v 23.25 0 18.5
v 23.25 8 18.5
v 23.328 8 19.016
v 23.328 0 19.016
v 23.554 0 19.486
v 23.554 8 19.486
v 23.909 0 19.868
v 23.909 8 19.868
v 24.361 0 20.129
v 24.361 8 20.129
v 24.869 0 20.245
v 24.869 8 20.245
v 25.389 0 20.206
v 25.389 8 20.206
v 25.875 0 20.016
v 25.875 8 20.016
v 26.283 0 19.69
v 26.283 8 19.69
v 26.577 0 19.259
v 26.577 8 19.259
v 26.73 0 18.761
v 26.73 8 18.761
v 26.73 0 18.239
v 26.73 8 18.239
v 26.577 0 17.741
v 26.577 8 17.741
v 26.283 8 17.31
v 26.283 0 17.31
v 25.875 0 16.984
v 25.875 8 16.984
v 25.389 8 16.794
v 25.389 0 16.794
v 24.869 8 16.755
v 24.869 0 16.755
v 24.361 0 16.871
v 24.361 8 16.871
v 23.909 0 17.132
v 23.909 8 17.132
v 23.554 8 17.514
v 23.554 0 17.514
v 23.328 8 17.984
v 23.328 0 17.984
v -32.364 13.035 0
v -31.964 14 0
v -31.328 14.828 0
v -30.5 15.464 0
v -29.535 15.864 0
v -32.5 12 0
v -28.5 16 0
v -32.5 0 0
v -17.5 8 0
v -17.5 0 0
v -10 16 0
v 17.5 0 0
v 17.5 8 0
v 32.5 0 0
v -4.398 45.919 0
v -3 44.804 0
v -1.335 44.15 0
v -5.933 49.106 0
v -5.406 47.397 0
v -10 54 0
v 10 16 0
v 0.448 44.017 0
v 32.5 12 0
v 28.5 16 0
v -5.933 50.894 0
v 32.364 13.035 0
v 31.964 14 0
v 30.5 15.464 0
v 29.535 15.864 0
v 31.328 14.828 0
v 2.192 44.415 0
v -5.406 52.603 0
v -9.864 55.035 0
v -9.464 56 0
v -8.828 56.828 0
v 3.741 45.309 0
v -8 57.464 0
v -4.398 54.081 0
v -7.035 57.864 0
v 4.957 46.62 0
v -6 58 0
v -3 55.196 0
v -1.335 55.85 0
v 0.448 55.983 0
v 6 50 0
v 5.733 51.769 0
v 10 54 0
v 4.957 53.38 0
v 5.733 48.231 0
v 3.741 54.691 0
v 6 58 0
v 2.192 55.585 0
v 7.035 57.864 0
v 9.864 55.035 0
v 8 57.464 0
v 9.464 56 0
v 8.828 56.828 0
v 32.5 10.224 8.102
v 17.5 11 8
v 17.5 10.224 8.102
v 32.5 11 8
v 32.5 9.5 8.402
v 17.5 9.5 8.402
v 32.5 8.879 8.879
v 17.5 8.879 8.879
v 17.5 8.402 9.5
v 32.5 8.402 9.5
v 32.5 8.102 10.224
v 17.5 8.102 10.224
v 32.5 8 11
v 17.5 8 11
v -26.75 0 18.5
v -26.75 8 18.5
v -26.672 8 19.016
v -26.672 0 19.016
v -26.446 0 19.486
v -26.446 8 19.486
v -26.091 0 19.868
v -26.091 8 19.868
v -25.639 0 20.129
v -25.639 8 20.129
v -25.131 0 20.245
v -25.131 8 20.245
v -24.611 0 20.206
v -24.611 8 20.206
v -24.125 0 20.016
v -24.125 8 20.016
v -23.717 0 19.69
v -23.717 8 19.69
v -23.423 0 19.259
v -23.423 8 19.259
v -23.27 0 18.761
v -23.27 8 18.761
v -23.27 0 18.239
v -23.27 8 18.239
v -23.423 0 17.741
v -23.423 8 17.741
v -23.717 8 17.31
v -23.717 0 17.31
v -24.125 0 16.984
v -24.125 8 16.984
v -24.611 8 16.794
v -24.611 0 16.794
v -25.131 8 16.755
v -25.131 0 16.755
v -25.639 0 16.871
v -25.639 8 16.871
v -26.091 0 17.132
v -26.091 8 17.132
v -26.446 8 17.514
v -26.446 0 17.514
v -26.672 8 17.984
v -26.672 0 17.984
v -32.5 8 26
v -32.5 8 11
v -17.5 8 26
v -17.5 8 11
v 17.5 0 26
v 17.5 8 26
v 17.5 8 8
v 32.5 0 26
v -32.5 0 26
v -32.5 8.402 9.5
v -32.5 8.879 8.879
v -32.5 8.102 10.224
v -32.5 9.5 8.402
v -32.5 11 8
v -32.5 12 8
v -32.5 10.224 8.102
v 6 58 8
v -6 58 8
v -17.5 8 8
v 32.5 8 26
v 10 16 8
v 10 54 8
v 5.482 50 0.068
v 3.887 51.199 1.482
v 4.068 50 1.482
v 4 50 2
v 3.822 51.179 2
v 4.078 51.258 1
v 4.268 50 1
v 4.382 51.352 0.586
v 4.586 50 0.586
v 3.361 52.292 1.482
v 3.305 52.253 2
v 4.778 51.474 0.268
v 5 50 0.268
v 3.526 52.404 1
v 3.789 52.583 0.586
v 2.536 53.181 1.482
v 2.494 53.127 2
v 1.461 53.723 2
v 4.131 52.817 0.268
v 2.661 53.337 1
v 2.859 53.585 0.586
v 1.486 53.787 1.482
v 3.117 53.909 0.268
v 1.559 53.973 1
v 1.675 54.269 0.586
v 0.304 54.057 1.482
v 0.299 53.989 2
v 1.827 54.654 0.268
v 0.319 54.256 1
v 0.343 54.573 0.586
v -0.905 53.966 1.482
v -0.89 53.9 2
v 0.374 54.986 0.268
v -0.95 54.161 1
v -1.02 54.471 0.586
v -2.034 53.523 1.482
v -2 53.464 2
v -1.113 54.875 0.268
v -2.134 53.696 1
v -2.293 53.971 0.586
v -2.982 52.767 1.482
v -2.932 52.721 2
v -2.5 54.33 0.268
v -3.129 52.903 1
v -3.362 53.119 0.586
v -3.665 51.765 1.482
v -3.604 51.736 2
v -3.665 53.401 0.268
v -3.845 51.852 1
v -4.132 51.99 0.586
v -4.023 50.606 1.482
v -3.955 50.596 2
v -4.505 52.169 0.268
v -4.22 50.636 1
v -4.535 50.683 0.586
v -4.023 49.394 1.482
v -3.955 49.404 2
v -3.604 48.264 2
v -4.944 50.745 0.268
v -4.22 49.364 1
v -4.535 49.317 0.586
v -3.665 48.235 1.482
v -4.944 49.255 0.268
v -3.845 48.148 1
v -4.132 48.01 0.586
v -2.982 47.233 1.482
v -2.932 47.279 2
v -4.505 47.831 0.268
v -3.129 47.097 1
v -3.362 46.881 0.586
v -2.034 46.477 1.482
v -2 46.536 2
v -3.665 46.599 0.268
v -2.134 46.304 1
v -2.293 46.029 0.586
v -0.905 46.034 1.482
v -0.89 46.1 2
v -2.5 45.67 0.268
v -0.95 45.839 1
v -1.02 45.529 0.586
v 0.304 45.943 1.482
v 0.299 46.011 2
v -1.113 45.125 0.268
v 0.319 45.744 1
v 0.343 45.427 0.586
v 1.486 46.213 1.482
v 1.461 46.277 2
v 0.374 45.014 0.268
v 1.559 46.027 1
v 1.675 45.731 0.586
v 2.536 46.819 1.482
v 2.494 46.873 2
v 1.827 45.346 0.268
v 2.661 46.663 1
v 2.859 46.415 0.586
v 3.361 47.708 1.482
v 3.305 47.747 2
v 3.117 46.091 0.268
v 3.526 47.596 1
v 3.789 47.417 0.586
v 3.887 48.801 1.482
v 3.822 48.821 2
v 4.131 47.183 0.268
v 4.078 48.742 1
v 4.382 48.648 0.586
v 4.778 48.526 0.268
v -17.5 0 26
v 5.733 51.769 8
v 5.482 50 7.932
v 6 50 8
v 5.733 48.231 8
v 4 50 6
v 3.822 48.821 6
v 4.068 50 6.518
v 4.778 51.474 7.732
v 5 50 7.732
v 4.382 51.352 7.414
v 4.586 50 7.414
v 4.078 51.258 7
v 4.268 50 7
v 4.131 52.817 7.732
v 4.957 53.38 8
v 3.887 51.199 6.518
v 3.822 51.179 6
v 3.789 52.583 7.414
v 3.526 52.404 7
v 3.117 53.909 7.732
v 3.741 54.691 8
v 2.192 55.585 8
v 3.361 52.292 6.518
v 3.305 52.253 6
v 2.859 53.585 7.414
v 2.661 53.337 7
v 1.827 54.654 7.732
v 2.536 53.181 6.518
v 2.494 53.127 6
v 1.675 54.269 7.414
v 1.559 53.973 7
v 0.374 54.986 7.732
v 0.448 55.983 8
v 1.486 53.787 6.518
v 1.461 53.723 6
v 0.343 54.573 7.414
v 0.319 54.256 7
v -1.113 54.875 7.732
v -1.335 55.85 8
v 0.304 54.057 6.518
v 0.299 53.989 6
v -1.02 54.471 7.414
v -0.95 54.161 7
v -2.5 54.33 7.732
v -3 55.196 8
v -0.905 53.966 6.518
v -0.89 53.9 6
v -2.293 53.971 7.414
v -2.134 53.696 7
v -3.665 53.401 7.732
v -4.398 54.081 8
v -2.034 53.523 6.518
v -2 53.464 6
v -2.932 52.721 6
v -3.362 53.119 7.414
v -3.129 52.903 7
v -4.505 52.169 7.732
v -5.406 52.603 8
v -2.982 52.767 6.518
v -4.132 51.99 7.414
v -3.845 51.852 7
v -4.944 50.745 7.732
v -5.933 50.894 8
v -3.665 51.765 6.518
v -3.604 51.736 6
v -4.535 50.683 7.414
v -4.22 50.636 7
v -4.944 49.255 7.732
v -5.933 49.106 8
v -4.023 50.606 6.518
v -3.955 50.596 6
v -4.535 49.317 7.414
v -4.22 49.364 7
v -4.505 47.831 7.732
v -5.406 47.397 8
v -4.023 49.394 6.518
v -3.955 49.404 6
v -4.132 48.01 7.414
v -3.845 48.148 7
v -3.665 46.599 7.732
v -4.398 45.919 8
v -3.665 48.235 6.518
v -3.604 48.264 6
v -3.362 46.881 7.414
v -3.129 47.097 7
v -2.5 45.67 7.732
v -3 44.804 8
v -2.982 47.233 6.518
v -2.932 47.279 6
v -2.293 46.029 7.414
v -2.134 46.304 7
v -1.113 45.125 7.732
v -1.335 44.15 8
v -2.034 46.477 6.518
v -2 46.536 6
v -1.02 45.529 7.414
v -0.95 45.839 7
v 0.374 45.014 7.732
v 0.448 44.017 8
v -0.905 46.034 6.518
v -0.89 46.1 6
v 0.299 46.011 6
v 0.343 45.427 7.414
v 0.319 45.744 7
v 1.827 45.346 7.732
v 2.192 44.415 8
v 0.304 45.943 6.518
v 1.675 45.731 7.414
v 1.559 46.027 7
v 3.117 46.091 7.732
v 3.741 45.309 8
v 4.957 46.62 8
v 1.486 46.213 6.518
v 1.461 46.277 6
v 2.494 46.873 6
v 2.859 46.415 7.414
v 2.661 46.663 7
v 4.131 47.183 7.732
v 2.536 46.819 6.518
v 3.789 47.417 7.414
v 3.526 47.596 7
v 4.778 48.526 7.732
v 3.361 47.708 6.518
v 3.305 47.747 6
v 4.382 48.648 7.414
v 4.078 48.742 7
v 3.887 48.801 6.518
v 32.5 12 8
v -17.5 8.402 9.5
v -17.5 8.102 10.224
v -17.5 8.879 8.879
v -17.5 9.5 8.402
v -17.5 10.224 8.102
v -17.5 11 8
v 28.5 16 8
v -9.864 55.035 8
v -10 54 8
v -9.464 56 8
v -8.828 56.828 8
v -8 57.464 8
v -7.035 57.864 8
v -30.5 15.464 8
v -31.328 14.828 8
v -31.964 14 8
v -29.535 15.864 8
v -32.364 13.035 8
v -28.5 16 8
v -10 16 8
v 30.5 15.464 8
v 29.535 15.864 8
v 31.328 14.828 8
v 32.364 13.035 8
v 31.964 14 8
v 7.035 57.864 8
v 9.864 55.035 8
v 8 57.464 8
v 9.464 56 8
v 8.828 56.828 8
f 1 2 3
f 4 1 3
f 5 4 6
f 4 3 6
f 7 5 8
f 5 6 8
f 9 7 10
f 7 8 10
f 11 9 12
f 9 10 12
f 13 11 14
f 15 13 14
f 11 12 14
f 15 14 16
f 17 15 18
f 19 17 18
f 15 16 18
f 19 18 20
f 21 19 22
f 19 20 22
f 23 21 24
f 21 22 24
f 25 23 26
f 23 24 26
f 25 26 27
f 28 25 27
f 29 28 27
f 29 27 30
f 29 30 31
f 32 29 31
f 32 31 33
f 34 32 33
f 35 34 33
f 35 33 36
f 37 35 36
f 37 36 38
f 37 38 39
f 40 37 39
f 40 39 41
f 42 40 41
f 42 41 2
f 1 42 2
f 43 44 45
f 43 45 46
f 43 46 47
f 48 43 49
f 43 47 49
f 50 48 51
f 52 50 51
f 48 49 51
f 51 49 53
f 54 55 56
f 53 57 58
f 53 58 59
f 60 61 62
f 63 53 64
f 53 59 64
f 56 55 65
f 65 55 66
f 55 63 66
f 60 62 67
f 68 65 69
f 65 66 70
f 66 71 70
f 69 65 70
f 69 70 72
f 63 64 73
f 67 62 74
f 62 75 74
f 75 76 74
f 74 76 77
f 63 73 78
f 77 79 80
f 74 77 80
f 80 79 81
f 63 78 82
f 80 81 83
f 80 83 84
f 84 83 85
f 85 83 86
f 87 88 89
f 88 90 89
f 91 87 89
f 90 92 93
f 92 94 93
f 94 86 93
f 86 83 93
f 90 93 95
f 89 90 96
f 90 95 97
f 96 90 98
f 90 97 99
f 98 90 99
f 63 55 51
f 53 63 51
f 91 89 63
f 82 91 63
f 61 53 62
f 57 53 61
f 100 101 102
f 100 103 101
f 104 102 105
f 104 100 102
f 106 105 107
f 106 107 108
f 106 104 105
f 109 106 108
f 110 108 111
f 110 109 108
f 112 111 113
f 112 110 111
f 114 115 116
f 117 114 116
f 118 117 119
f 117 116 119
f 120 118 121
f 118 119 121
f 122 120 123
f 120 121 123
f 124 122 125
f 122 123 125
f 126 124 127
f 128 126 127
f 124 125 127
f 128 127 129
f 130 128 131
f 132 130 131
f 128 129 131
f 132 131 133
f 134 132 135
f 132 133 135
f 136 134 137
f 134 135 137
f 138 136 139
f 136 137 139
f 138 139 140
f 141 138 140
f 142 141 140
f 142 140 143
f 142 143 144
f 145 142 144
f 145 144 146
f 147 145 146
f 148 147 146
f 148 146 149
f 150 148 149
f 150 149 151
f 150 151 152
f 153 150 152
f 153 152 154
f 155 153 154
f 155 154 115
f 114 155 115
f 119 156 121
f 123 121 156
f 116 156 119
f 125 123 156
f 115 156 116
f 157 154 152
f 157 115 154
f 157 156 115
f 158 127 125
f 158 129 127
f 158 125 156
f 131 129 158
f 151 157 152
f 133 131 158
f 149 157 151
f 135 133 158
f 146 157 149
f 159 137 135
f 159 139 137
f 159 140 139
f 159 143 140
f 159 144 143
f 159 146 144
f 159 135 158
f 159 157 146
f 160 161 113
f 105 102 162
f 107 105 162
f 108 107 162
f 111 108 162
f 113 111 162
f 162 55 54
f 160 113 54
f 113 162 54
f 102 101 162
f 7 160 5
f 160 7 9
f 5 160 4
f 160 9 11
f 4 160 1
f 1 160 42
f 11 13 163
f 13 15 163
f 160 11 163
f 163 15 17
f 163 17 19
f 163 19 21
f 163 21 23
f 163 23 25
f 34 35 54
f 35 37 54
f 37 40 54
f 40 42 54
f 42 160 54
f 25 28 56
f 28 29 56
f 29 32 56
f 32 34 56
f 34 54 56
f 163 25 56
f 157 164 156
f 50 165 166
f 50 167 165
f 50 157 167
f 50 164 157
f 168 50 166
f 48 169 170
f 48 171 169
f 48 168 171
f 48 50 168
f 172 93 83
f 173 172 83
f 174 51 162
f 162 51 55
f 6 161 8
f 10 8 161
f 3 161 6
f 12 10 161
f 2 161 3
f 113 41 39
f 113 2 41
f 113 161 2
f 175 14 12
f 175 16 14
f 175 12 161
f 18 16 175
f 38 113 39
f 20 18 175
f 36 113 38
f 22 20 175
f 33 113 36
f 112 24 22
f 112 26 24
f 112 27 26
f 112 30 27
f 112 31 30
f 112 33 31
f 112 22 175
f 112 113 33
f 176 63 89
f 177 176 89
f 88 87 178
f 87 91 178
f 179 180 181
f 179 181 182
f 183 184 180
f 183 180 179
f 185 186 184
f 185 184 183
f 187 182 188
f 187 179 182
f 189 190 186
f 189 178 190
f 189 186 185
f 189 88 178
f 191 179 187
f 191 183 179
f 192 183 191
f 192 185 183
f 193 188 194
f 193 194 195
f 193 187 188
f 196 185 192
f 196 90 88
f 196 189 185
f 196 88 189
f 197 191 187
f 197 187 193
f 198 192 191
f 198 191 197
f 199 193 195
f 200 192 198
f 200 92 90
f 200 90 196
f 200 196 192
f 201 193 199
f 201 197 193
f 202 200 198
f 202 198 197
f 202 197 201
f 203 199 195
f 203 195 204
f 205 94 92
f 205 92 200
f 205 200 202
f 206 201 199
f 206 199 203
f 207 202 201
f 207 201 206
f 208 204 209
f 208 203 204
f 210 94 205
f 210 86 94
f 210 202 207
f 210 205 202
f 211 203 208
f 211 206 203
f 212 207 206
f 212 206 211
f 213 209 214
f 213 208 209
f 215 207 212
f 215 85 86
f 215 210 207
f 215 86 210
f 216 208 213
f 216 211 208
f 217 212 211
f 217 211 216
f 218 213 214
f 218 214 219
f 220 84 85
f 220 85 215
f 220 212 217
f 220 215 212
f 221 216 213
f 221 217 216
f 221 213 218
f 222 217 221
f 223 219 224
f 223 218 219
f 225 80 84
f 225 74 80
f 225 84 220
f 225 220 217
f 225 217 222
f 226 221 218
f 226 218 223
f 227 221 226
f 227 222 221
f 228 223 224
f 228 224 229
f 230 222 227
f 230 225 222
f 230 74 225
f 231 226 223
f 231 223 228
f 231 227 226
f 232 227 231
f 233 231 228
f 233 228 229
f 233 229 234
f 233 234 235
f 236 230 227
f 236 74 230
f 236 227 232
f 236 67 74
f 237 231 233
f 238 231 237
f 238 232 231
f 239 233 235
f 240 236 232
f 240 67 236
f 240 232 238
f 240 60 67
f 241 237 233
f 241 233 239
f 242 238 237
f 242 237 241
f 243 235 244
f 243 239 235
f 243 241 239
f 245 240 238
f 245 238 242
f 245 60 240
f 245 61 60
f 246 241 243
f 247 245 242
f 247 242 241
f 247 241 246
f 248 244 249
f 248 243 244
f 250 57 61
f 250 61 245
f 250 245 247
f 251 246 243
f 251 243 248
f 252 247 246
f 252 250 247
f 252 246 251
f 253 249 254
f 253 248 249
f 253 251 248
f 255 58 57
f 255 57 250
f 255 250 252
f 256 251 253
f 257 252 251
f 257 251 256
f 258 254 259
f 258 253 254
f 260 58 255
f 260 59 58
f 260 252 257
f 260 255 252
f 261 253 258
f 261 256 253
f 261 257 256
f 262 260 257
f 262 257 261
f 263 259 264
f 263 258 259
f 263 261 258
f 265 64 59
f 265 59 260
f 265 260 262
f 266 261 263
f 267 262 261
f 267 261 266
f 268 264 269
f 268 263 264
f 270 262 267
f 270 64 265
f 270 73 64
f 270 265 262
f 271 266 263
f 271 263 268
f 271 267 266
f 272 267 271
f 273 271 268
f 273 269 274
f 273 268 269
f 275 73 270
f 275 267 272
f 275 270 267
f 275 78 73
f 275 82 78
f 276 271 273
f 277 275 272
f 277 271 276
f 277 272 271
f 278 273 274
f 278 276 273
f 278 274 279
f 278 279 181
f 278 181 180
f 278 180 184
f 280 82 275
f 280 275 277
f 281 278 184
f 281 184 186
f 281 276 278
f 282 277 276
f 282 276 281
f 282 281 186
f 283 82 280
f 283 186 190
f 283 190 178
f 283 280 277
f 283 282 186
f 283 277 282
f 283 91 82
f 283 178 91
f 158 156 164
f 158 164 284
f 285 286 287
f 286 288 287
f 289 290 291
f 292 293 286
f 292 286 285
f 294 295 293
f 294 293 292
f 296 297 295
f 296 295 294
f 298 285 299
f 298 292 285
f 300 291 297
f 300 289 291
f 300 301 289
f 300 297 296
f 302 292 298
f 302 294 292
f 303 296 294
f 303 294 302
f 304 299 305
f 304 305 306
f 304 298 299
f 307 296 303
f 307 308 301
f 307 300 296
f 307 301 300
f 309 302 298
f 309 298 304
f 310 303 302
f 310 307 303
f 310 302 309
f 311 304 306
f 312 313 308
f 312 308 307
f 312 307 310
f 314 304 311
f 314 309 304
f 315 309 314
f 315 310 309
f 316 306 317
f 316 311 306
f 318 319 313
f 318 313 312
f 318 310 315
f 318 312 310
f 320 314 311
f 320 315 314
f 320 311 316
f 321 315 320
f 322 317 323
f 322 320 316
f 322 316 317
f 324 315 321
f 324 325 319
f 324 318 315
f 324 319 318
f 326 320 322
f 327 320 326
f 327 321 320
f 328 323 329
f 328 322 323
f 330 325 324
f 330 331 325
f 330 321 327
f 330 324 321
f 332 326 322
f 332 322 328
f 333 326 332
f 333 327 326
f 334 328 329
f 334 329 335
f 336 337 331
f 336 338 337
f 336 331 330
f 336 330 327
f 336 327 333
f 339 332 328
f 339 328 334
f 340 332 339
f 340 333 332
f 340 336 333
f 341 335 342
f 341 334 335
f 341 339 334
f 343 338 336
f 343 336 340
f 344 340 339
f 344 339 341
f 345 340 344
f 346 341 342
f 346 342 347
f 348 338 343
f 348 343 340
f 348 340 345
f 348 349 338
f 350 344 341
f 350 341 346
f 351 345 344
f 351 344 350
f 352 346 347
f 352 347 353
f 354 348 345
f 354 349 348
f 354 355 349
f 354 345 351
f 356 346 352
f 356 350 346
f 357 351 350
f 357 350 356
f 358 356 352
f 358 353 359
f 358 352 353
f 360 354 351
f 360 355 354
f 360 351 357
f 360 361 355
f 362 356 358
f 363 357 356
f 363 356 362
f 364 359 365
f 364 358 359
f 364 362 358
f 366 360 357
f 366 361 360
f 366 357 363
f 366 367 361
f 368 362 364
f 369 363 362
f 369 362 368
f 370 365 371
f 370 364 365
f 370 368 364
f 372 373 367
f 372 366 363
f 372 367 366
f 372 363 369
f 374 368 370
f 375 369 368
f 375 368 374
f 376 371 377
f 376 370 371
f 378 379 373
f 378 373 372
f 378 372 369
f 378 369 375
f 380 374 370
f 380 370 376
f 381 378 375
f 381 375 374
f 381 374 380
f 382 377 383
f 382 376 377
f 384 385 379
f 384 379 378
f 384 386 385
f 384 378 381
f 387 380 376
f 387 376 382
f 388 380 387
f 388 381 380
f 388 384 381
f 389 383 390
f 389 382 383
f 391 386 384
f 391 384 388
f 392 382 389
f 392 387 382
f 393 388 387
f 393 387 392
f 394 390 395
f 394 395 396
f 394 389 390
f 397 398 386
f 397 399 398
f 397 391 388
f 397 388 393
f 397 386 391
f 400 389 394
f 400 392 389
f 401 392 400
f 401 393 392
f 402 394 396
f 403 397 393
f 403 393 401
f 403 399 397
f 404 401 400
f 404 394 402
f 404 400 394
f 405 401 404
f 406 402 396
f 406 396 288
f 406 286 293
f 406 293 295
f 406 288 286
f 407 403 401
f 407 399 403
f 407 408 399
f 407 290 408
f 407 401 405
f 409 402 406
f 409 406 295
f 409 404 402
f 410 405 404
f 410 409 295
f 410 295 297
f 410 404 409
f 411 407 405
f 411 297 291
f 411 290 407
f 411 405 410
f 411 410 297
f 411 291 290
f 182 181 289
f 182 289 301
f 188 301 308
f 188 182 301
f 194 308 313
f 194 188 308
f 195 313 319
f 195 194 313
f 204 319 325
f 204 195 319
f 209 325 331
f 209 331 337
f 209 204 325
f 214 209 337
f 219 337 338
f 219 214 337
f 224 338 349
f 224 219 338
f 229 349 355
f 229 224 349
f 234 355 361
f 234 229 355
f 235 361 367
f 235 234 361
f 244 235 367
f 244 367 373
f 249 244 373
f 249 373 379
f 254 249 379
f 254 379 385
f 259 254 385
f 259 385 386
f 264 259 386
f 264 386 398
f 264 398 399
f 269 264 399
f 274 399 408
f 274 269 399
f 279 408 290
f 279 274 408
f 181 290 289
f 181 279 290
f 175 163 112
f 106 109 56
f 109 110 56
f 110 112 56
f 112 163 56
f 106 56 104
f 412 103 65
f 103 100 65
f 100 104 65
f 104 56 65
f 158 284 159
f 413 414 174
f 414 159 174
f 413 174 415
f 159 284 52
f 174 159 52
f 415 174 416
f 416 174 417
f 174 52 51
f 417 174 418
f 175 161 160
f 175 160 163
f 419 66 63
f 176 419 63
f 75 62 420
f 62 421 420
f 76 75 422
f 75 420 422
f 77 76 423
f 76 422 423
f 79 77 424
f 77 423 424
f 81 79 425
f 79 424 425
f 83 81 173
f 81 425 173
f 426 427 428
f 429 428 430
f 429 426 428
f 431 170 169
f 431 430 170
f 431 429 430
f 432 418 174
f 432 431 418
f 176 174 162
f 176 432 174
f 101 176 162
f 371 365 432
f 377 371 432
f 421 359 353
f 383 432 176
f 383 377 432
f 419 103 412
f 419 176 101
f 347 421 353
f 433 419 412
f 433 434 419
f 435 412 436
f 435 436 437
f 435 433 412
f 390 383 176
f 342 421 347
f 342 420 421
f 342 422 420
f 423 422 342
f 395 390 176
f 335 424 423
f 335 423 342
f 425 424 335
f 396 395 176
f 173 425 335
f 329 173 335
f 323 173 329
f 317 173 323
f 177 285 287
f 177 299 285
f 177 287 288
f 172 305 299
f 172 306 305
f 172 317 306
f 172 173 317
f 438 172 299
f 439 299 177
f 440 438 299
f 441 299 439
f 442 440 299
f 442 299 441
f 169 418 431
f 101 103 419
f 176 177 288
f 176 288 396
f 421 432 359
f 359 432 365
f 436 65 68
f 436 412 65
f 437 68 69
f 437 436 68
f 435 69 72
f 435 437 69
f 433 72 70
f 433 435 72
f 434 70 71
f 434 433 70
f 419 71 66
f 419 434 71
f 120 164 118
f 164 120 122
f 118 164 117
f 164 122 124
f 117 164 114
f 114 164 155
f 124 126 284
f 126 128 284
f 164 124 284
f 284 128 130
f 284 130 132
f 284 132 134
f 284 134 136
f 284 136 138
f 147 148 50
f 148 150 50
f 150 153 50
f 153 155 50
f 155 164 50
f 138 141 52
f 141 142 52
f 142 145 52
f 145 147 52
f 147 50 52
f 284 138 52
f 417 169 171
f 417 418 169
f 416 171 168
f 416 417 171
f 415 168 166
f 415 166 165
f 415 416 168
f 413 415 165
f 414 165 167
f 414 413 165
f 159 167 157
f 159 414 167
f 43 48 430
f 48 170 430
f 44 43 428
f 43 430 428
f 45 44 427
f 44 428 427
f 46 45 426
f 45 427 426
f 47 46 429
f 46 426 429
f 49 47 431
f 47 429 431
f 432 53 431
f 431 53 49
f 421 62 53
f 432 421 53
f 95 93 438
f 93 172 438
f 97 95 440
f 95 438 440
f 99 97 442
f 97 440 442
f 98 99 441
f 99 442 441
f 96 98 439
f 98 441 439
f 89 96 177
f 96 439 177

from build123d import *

# Parameters (mm, degrees)
SKETCH_R     = 4
PAD_DEPTH    = 8
SKETCH001_W  = 15
SKETCH001_H  = 8
PAD001_DEPTH = 18
SKETCH002_R  = 1.75
POCKET_DEPTH = 8.001
FILLET_R     = 2
FILLET001_R  = 2
FILLET002_R  = 4
FILLET003_R  = 3


with BuildPart() as part:
    # Sketch → Pad (new body)
    with BuildSketch(Plane.XY):
        Polygon((-32.5, 0), (-17.5, 0), (-17.5, 8), (17.5, 8), (17.5, 0), (32.5, 0), (32.5, 16), (10, 16), (10, 58), (-10, 58), (-10, 16), (-32.5, 16), align=None)
        with Locations((0, 50)):
            Circle(SKETCH_R, mode=Mode.SUBTRACT)
    extrude(amount=PAD_DEPTH)

    # Sketch001 (on Face15 of Pad) → Pad001 (join)
    with BuildSketch(Plane.XY.offset(8)):
        with Locations((-25, 4)):
            Rectangle(SKETCH001_W, SKETCH001_H)
        with Locations((25, 4)):
            Rectangle(SKETCH001_W, SKETCH001_H)
    extrude(amount=PAD001_DEPTH)

    # Sketch002 (on Face11 of Pad001) → Pocket (cut, through all)
    with BuildSketch(Plane(origin=(0, 8, 0), x_dir=(-1, 0, 0), z_dir=(0, 1, 0))):
        with Locations((-25, 18.5)):
            Circle(SKETCH002_R)
        with Locations((25, 18.5)):
            Circle(SKETCH002_R)
    extrude(amount=-POCKET_DEPTH, mode=Mode.SUBTRACT)

    # Fillet
    fillet_edges = [part.edges().sort_by_distance(p)[0] for p in [
        (-4, 50, 8),
    ]]
    fillet(fillet_edges, radius=FILLET_R)

    # Fillet001
    fillet001_edges = [part.edges().sort_by_distance(p)[0] for p in [
        (-4, 50, 0),
    ]]
    fillet(fillet001_edges, radius=FILLET001_R)

    # Fillet002
    fillet002_edges = [part.edges().sort_by_distance(p)[0] for p in [
        (-10, 58, 4),
        (10, 58, 4),
        (-32.5, 16, 4),
        (32.5, 16, 4),
    ]]
    fillet(fillet002_edges, radius=FILLET002_R)

    # Fillet003
    fillet003_edges = [part.edges().sort_by_distance(p)[0] for p in [
        (25, 8, 8),
        (-25, 8, 8),
    ]]
    fillet(fillet003_edges, radius=FILLET003_R)


solid = part.part
